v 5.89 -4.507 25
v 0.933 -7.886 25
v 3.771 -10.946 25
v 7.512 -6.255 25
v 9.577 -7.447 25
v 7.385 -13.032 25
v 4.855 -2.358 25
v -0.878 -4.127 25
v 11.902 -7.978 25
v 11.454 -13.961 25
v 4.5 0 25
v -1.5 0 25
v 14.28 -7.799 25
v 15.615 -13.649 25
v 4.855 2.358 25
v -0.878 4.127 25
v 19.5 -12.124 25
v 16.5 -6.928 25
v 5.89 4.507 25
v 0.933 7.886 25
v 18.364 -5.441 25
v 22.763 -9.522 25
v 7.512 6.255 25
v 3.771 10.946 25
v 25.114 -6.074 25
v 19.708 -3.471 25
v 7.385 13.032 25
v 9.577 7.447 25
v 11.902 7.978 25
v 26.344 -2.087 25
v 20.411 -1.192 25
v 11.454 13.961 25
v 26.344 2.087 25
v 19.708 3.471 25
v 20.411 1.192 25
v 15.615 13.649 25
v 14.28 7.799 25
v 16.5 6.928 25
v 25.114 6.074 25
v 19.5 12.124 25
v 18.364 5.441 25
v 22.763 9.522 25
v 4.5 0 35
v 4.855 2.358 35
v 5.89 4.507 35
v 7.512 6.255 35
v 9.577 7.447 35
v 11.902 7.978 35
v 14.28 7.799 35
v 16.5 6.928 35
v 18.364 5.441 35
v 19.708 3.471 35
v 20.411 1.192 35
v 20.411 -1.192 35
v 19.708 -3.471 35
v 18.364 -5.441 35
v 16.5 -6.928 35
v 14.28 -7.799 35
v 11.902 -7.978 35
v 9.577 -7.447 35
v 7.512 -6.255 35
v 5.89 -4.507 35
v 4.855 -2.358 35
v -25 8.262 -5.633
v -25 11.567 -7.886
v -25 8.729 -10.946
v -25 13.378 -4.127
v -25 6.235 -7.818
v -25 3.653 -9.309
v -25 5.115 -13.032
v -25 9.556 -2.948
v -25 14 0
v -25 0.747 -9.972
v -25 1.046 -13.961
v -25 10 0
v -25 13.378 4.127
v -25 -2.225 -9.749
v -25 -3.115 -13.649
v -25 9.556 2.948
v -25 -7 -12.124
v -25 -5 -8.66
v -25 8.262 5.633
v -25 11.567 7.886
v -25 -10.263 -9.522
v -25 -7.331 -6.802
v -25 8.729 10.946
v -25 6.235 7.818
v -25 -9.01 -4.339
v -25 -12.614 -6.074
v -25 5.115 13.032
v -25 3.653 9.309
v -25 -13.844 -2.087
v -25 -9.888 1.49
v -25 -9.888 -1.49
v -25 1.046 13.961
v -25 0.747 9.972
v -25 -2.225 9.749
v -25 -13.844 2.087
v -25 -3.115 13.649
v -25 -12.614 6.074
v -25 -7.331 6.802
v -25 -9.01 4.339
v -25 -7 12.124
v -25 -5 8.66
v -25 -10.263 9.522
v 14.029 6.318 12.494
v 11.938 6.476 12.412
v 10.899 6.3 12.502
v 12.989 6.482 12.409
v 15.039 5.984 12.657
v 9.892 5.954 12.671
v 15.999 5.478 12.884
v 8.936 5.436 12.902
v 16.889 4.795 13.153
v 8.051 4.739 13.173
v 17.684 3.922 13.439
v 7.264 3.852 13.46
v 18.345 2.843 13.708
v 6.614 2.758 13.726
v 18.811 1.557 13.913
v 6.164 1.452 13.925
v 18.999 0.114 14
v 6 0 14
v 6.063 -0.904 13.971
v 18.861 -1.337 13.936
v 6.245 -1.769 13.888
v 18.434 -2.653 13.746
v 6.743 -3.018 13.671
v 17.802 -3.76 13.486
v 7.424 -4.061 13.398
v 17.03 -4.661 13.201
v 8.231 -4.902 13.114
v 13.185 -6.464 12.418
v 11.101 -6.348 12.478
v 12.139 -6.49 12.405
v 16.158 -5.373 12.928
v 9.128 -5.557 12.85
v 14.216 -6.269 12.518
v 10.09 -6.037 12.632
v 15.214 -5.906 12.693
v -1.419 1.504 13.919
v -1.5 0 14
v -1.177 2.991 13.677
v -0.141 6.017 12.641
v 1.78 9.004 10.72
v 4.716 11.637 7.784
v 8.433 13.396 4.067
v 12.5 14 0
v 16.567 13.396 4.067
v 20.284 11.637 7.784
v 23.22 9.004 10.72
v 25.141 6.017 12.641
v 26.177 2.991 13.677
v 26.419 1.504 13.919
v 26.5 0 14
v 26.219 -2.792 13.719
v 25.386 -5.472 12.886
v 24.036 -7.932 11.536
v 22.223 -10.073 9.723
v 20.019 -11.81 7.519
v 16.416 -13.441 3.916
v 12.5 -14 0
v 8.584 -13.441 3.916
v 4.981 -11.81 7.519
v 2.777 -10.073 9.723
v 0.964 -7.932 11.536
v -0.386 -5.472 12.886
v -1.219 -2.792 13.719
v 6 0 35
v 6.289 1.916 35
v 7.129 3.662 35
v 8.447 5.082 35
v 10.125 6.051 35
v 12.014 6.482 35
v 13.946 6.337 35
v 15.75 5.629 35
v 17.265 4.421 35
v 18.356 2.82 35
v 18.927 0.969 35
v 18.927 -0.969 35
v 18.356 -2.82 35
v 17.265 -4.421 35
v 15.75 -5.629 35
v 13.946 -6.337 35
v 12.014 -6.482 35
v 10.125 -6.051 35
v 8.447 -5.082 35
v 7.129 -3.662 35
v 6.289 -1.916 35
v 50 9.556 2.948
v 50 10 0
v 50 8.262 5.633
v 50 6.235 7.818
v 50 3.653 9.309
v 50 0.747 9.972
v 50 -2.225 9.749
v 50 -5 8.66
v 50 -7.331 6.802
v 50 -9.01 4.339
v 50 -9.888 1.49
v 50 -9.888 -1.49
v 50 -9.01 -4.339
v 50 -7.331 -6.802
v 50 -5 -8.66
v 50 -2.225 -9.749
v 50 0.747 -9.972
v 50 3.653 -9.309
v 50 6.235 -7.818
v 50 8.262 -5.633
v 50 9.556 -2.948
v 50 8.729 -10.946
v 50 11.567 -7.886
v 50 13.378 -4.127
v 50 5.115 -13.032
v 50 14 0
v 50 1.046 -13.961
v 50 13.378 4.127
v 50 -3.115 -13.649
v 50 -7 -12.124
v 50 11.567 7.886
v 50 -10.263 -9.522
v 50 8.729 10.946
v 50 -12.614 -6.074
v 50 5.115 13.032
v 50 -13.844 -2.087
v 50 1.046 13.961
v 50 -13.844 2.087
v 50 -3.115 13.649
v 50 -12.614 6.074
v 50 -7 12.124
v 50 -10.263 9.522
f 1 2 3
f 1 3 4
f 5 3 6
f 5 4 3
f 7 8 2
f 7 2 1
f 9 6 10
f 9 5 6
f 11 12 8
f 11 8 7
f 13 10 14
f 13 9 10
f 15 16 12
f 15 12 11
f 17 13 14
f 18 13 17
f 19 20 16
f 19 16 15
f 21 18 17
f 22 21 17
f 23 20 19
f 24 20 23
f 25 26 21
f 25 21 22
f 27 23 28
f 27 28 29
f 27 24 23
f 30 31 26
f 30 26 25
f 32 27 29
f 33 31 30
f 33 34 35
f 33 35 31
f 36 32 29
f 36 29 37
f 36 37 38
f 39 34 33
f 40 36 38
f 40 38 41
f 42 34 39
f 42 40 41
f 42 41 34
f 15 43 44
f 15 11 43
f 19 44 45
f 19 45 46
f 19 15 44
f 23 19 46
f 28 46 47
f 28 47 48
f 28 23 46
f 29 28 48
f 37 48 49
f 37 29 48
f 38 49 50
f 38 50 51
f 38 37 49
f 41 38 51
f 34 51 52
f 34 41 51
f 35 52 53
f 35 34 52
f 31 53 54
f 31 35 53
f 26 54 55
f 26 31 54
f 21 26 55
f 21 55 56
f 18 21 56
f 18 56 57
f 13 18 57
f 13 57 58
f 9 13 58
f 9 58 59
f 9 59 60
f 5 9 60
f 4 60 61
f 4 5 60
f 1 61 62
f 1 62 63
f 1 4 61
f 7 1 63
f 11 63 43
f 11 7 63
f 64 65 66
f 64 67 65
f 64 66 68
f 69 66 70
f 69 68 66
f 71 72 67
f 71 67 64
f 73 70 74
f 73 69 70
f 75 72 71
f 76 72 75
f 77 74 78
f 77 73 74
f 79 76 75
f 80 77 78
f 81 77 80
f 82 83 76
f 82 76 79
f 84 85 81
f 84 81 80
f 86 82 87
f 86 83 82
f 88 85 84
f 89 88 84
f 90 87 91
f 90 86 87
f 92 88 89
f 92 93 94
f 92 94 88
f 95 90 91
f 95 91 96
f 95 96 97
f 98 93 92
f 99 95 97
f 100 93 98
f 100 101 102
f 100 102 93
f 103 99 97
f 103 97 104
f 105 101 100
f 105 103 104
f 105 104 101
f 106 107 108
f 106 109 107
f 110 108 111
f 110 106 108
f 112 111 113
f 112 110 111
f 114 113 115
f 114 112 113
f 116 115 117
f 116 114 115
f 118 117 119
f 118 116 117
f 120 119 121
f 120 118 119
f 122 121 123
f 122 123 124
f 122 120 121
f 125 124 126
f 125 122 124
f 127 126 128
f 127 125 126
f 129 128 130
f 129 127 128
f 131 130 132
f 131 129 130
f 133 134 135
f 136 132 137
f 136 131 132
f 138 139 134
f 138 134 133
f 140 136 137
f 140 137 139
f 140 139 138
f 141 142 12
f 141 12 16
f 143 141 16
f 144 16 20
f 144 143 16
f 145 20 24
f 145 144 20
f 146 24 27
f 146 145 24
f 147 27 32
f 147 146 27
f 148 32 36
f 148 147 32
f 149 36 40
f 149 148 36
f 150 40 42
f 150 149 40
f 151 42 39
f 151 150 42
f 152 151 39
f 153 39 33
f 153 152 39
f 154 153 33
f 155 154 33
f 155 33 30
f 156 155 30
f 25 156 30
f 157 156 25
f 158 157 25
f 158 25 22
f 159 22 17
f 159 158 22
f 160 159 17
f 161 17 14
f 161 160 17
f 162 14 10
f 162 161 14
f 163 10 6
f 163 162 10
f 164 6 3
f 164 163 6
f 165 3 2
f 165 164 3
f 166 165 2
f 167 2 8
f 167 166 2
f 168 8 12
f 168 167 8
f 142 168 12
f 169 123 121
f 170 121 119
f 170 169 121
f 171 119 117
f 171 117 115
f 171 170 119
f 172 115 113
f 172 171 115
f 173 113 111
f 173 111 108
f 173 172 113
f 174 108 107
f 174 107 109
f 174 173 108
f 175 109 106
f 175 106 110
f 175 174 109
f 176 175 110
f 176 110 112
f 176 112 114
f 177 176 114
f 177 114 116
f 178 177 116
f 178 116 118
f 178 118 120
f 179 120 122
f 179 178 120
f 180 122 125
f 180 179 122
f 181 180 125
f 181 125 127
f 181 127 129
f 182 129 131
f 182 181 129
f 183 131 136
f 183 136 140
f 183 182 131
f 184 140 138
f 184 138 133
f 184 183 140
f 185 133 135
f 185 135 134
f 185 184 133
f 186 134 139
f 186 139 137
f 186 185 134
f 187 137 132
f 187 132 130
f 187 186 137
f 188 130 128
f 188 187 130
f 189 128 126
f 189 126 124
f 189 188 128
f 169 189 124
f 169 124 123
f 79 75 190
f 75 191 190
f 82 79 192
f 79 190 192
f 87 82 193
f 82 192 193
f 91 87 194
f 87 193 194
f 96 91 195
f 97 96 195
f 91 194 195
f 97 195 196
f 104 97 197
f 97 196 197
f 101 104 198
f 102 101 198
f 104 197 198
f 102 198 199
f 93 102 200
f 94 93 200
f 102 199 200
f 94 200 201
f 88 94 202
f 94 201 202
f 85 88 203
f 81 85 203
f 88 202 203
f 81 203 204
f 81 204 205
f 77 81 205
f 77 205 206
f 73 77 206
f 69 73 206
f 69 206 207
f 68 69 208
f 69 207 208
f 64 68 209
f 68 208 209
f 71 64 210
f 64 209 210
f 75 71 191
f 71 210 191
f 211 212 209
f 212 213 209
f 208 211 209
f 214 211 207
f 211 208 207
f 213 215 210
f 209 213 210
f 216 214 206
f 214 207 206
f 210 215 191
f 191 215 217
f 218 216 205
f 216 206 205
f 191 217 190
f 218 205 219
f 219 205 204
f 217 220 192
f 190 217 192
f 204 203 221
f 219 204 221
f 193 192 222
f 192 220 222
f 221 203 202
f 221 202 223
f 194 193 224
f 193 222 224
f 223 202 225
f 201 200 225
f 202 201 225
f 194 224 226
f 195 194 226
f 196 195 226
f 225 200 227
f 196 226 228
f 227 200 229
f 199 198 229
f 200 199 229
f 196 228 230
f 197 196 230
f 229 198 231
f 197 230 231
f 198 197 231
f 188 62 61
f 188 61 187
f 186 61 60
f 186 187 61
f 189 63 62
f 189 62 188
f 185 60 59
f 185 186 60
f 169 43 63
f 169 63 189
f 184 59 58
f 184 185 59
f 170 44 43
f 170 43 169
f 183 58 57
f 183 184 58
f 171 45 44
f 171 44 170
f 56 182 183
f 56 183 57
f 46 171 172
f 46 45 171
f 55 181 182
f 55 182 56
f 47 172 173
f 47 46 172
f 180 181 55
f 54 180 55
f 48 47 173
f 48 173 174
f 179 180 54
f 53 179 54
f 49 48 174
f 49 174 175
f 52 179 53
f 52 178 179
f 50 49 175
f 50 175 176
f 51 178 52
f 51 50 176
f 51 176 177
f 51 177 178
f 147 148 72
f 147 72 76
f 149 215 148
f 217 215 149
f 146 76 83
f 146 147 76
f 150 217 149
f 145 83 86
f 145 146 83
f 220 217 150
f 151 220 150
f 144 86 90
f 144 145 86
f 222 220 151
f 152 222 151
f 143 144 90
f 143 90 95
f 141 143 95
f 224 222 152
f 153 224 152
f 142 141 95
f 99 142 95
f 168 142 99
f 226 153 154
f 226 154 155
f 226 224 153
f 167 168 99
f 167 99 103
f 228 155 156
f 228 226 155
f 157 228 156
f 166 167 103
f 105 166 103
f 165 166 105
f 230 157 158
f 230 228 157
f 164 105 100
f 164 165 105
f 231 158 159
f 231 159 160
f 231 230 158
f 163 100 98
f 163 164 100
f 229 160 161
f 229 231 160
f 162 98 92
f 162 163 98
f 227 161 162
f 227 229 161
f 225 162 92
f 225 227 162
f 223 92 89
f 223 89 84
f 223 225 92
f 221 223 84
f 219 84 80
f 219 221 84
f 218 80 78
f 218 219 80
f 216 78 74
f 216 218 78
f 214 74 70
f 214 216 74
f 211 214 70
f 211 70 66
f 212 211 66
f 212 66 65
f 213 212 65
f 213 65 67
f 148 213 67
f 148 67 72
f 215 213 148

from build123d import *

# Parameters (mm, degrees)
F0_W     = 75
F0_H     = 4
F4_R     = 10
F5_DEPTH = 75.001


with BuildPart() as f1:
    # F0 (on Top) → F1 (revolve)
    with BuildSketch(Plane.XY):
        with Locations((12.5, 12)):
            Rectangle(F0_W, F0_H)
    revolve(axis=Axis((-0.954778, 0, 0), (1, 0, 0)))

    # F2 (on Front) → F3 (revolve)
    with BuildSketch(Plane.XZ):
        Polygon((-1.5, 25), (-1.5, 0), (6, 0), (6, 35), (4.5, 35), (4.5, 25), align=None)
    revolve(axis=Axis((12.5, 0, -7.054515), (0, 0, -1)))

    # F4 (on face) → F5 (cut, through all)
    with BuildSketch(Plane.YZ.offset(50)):
        Circle(F4_R)
    extrude(amount=-F5_DEPTH, mode=Mode.SUBTRACT)


solid = f1.part
